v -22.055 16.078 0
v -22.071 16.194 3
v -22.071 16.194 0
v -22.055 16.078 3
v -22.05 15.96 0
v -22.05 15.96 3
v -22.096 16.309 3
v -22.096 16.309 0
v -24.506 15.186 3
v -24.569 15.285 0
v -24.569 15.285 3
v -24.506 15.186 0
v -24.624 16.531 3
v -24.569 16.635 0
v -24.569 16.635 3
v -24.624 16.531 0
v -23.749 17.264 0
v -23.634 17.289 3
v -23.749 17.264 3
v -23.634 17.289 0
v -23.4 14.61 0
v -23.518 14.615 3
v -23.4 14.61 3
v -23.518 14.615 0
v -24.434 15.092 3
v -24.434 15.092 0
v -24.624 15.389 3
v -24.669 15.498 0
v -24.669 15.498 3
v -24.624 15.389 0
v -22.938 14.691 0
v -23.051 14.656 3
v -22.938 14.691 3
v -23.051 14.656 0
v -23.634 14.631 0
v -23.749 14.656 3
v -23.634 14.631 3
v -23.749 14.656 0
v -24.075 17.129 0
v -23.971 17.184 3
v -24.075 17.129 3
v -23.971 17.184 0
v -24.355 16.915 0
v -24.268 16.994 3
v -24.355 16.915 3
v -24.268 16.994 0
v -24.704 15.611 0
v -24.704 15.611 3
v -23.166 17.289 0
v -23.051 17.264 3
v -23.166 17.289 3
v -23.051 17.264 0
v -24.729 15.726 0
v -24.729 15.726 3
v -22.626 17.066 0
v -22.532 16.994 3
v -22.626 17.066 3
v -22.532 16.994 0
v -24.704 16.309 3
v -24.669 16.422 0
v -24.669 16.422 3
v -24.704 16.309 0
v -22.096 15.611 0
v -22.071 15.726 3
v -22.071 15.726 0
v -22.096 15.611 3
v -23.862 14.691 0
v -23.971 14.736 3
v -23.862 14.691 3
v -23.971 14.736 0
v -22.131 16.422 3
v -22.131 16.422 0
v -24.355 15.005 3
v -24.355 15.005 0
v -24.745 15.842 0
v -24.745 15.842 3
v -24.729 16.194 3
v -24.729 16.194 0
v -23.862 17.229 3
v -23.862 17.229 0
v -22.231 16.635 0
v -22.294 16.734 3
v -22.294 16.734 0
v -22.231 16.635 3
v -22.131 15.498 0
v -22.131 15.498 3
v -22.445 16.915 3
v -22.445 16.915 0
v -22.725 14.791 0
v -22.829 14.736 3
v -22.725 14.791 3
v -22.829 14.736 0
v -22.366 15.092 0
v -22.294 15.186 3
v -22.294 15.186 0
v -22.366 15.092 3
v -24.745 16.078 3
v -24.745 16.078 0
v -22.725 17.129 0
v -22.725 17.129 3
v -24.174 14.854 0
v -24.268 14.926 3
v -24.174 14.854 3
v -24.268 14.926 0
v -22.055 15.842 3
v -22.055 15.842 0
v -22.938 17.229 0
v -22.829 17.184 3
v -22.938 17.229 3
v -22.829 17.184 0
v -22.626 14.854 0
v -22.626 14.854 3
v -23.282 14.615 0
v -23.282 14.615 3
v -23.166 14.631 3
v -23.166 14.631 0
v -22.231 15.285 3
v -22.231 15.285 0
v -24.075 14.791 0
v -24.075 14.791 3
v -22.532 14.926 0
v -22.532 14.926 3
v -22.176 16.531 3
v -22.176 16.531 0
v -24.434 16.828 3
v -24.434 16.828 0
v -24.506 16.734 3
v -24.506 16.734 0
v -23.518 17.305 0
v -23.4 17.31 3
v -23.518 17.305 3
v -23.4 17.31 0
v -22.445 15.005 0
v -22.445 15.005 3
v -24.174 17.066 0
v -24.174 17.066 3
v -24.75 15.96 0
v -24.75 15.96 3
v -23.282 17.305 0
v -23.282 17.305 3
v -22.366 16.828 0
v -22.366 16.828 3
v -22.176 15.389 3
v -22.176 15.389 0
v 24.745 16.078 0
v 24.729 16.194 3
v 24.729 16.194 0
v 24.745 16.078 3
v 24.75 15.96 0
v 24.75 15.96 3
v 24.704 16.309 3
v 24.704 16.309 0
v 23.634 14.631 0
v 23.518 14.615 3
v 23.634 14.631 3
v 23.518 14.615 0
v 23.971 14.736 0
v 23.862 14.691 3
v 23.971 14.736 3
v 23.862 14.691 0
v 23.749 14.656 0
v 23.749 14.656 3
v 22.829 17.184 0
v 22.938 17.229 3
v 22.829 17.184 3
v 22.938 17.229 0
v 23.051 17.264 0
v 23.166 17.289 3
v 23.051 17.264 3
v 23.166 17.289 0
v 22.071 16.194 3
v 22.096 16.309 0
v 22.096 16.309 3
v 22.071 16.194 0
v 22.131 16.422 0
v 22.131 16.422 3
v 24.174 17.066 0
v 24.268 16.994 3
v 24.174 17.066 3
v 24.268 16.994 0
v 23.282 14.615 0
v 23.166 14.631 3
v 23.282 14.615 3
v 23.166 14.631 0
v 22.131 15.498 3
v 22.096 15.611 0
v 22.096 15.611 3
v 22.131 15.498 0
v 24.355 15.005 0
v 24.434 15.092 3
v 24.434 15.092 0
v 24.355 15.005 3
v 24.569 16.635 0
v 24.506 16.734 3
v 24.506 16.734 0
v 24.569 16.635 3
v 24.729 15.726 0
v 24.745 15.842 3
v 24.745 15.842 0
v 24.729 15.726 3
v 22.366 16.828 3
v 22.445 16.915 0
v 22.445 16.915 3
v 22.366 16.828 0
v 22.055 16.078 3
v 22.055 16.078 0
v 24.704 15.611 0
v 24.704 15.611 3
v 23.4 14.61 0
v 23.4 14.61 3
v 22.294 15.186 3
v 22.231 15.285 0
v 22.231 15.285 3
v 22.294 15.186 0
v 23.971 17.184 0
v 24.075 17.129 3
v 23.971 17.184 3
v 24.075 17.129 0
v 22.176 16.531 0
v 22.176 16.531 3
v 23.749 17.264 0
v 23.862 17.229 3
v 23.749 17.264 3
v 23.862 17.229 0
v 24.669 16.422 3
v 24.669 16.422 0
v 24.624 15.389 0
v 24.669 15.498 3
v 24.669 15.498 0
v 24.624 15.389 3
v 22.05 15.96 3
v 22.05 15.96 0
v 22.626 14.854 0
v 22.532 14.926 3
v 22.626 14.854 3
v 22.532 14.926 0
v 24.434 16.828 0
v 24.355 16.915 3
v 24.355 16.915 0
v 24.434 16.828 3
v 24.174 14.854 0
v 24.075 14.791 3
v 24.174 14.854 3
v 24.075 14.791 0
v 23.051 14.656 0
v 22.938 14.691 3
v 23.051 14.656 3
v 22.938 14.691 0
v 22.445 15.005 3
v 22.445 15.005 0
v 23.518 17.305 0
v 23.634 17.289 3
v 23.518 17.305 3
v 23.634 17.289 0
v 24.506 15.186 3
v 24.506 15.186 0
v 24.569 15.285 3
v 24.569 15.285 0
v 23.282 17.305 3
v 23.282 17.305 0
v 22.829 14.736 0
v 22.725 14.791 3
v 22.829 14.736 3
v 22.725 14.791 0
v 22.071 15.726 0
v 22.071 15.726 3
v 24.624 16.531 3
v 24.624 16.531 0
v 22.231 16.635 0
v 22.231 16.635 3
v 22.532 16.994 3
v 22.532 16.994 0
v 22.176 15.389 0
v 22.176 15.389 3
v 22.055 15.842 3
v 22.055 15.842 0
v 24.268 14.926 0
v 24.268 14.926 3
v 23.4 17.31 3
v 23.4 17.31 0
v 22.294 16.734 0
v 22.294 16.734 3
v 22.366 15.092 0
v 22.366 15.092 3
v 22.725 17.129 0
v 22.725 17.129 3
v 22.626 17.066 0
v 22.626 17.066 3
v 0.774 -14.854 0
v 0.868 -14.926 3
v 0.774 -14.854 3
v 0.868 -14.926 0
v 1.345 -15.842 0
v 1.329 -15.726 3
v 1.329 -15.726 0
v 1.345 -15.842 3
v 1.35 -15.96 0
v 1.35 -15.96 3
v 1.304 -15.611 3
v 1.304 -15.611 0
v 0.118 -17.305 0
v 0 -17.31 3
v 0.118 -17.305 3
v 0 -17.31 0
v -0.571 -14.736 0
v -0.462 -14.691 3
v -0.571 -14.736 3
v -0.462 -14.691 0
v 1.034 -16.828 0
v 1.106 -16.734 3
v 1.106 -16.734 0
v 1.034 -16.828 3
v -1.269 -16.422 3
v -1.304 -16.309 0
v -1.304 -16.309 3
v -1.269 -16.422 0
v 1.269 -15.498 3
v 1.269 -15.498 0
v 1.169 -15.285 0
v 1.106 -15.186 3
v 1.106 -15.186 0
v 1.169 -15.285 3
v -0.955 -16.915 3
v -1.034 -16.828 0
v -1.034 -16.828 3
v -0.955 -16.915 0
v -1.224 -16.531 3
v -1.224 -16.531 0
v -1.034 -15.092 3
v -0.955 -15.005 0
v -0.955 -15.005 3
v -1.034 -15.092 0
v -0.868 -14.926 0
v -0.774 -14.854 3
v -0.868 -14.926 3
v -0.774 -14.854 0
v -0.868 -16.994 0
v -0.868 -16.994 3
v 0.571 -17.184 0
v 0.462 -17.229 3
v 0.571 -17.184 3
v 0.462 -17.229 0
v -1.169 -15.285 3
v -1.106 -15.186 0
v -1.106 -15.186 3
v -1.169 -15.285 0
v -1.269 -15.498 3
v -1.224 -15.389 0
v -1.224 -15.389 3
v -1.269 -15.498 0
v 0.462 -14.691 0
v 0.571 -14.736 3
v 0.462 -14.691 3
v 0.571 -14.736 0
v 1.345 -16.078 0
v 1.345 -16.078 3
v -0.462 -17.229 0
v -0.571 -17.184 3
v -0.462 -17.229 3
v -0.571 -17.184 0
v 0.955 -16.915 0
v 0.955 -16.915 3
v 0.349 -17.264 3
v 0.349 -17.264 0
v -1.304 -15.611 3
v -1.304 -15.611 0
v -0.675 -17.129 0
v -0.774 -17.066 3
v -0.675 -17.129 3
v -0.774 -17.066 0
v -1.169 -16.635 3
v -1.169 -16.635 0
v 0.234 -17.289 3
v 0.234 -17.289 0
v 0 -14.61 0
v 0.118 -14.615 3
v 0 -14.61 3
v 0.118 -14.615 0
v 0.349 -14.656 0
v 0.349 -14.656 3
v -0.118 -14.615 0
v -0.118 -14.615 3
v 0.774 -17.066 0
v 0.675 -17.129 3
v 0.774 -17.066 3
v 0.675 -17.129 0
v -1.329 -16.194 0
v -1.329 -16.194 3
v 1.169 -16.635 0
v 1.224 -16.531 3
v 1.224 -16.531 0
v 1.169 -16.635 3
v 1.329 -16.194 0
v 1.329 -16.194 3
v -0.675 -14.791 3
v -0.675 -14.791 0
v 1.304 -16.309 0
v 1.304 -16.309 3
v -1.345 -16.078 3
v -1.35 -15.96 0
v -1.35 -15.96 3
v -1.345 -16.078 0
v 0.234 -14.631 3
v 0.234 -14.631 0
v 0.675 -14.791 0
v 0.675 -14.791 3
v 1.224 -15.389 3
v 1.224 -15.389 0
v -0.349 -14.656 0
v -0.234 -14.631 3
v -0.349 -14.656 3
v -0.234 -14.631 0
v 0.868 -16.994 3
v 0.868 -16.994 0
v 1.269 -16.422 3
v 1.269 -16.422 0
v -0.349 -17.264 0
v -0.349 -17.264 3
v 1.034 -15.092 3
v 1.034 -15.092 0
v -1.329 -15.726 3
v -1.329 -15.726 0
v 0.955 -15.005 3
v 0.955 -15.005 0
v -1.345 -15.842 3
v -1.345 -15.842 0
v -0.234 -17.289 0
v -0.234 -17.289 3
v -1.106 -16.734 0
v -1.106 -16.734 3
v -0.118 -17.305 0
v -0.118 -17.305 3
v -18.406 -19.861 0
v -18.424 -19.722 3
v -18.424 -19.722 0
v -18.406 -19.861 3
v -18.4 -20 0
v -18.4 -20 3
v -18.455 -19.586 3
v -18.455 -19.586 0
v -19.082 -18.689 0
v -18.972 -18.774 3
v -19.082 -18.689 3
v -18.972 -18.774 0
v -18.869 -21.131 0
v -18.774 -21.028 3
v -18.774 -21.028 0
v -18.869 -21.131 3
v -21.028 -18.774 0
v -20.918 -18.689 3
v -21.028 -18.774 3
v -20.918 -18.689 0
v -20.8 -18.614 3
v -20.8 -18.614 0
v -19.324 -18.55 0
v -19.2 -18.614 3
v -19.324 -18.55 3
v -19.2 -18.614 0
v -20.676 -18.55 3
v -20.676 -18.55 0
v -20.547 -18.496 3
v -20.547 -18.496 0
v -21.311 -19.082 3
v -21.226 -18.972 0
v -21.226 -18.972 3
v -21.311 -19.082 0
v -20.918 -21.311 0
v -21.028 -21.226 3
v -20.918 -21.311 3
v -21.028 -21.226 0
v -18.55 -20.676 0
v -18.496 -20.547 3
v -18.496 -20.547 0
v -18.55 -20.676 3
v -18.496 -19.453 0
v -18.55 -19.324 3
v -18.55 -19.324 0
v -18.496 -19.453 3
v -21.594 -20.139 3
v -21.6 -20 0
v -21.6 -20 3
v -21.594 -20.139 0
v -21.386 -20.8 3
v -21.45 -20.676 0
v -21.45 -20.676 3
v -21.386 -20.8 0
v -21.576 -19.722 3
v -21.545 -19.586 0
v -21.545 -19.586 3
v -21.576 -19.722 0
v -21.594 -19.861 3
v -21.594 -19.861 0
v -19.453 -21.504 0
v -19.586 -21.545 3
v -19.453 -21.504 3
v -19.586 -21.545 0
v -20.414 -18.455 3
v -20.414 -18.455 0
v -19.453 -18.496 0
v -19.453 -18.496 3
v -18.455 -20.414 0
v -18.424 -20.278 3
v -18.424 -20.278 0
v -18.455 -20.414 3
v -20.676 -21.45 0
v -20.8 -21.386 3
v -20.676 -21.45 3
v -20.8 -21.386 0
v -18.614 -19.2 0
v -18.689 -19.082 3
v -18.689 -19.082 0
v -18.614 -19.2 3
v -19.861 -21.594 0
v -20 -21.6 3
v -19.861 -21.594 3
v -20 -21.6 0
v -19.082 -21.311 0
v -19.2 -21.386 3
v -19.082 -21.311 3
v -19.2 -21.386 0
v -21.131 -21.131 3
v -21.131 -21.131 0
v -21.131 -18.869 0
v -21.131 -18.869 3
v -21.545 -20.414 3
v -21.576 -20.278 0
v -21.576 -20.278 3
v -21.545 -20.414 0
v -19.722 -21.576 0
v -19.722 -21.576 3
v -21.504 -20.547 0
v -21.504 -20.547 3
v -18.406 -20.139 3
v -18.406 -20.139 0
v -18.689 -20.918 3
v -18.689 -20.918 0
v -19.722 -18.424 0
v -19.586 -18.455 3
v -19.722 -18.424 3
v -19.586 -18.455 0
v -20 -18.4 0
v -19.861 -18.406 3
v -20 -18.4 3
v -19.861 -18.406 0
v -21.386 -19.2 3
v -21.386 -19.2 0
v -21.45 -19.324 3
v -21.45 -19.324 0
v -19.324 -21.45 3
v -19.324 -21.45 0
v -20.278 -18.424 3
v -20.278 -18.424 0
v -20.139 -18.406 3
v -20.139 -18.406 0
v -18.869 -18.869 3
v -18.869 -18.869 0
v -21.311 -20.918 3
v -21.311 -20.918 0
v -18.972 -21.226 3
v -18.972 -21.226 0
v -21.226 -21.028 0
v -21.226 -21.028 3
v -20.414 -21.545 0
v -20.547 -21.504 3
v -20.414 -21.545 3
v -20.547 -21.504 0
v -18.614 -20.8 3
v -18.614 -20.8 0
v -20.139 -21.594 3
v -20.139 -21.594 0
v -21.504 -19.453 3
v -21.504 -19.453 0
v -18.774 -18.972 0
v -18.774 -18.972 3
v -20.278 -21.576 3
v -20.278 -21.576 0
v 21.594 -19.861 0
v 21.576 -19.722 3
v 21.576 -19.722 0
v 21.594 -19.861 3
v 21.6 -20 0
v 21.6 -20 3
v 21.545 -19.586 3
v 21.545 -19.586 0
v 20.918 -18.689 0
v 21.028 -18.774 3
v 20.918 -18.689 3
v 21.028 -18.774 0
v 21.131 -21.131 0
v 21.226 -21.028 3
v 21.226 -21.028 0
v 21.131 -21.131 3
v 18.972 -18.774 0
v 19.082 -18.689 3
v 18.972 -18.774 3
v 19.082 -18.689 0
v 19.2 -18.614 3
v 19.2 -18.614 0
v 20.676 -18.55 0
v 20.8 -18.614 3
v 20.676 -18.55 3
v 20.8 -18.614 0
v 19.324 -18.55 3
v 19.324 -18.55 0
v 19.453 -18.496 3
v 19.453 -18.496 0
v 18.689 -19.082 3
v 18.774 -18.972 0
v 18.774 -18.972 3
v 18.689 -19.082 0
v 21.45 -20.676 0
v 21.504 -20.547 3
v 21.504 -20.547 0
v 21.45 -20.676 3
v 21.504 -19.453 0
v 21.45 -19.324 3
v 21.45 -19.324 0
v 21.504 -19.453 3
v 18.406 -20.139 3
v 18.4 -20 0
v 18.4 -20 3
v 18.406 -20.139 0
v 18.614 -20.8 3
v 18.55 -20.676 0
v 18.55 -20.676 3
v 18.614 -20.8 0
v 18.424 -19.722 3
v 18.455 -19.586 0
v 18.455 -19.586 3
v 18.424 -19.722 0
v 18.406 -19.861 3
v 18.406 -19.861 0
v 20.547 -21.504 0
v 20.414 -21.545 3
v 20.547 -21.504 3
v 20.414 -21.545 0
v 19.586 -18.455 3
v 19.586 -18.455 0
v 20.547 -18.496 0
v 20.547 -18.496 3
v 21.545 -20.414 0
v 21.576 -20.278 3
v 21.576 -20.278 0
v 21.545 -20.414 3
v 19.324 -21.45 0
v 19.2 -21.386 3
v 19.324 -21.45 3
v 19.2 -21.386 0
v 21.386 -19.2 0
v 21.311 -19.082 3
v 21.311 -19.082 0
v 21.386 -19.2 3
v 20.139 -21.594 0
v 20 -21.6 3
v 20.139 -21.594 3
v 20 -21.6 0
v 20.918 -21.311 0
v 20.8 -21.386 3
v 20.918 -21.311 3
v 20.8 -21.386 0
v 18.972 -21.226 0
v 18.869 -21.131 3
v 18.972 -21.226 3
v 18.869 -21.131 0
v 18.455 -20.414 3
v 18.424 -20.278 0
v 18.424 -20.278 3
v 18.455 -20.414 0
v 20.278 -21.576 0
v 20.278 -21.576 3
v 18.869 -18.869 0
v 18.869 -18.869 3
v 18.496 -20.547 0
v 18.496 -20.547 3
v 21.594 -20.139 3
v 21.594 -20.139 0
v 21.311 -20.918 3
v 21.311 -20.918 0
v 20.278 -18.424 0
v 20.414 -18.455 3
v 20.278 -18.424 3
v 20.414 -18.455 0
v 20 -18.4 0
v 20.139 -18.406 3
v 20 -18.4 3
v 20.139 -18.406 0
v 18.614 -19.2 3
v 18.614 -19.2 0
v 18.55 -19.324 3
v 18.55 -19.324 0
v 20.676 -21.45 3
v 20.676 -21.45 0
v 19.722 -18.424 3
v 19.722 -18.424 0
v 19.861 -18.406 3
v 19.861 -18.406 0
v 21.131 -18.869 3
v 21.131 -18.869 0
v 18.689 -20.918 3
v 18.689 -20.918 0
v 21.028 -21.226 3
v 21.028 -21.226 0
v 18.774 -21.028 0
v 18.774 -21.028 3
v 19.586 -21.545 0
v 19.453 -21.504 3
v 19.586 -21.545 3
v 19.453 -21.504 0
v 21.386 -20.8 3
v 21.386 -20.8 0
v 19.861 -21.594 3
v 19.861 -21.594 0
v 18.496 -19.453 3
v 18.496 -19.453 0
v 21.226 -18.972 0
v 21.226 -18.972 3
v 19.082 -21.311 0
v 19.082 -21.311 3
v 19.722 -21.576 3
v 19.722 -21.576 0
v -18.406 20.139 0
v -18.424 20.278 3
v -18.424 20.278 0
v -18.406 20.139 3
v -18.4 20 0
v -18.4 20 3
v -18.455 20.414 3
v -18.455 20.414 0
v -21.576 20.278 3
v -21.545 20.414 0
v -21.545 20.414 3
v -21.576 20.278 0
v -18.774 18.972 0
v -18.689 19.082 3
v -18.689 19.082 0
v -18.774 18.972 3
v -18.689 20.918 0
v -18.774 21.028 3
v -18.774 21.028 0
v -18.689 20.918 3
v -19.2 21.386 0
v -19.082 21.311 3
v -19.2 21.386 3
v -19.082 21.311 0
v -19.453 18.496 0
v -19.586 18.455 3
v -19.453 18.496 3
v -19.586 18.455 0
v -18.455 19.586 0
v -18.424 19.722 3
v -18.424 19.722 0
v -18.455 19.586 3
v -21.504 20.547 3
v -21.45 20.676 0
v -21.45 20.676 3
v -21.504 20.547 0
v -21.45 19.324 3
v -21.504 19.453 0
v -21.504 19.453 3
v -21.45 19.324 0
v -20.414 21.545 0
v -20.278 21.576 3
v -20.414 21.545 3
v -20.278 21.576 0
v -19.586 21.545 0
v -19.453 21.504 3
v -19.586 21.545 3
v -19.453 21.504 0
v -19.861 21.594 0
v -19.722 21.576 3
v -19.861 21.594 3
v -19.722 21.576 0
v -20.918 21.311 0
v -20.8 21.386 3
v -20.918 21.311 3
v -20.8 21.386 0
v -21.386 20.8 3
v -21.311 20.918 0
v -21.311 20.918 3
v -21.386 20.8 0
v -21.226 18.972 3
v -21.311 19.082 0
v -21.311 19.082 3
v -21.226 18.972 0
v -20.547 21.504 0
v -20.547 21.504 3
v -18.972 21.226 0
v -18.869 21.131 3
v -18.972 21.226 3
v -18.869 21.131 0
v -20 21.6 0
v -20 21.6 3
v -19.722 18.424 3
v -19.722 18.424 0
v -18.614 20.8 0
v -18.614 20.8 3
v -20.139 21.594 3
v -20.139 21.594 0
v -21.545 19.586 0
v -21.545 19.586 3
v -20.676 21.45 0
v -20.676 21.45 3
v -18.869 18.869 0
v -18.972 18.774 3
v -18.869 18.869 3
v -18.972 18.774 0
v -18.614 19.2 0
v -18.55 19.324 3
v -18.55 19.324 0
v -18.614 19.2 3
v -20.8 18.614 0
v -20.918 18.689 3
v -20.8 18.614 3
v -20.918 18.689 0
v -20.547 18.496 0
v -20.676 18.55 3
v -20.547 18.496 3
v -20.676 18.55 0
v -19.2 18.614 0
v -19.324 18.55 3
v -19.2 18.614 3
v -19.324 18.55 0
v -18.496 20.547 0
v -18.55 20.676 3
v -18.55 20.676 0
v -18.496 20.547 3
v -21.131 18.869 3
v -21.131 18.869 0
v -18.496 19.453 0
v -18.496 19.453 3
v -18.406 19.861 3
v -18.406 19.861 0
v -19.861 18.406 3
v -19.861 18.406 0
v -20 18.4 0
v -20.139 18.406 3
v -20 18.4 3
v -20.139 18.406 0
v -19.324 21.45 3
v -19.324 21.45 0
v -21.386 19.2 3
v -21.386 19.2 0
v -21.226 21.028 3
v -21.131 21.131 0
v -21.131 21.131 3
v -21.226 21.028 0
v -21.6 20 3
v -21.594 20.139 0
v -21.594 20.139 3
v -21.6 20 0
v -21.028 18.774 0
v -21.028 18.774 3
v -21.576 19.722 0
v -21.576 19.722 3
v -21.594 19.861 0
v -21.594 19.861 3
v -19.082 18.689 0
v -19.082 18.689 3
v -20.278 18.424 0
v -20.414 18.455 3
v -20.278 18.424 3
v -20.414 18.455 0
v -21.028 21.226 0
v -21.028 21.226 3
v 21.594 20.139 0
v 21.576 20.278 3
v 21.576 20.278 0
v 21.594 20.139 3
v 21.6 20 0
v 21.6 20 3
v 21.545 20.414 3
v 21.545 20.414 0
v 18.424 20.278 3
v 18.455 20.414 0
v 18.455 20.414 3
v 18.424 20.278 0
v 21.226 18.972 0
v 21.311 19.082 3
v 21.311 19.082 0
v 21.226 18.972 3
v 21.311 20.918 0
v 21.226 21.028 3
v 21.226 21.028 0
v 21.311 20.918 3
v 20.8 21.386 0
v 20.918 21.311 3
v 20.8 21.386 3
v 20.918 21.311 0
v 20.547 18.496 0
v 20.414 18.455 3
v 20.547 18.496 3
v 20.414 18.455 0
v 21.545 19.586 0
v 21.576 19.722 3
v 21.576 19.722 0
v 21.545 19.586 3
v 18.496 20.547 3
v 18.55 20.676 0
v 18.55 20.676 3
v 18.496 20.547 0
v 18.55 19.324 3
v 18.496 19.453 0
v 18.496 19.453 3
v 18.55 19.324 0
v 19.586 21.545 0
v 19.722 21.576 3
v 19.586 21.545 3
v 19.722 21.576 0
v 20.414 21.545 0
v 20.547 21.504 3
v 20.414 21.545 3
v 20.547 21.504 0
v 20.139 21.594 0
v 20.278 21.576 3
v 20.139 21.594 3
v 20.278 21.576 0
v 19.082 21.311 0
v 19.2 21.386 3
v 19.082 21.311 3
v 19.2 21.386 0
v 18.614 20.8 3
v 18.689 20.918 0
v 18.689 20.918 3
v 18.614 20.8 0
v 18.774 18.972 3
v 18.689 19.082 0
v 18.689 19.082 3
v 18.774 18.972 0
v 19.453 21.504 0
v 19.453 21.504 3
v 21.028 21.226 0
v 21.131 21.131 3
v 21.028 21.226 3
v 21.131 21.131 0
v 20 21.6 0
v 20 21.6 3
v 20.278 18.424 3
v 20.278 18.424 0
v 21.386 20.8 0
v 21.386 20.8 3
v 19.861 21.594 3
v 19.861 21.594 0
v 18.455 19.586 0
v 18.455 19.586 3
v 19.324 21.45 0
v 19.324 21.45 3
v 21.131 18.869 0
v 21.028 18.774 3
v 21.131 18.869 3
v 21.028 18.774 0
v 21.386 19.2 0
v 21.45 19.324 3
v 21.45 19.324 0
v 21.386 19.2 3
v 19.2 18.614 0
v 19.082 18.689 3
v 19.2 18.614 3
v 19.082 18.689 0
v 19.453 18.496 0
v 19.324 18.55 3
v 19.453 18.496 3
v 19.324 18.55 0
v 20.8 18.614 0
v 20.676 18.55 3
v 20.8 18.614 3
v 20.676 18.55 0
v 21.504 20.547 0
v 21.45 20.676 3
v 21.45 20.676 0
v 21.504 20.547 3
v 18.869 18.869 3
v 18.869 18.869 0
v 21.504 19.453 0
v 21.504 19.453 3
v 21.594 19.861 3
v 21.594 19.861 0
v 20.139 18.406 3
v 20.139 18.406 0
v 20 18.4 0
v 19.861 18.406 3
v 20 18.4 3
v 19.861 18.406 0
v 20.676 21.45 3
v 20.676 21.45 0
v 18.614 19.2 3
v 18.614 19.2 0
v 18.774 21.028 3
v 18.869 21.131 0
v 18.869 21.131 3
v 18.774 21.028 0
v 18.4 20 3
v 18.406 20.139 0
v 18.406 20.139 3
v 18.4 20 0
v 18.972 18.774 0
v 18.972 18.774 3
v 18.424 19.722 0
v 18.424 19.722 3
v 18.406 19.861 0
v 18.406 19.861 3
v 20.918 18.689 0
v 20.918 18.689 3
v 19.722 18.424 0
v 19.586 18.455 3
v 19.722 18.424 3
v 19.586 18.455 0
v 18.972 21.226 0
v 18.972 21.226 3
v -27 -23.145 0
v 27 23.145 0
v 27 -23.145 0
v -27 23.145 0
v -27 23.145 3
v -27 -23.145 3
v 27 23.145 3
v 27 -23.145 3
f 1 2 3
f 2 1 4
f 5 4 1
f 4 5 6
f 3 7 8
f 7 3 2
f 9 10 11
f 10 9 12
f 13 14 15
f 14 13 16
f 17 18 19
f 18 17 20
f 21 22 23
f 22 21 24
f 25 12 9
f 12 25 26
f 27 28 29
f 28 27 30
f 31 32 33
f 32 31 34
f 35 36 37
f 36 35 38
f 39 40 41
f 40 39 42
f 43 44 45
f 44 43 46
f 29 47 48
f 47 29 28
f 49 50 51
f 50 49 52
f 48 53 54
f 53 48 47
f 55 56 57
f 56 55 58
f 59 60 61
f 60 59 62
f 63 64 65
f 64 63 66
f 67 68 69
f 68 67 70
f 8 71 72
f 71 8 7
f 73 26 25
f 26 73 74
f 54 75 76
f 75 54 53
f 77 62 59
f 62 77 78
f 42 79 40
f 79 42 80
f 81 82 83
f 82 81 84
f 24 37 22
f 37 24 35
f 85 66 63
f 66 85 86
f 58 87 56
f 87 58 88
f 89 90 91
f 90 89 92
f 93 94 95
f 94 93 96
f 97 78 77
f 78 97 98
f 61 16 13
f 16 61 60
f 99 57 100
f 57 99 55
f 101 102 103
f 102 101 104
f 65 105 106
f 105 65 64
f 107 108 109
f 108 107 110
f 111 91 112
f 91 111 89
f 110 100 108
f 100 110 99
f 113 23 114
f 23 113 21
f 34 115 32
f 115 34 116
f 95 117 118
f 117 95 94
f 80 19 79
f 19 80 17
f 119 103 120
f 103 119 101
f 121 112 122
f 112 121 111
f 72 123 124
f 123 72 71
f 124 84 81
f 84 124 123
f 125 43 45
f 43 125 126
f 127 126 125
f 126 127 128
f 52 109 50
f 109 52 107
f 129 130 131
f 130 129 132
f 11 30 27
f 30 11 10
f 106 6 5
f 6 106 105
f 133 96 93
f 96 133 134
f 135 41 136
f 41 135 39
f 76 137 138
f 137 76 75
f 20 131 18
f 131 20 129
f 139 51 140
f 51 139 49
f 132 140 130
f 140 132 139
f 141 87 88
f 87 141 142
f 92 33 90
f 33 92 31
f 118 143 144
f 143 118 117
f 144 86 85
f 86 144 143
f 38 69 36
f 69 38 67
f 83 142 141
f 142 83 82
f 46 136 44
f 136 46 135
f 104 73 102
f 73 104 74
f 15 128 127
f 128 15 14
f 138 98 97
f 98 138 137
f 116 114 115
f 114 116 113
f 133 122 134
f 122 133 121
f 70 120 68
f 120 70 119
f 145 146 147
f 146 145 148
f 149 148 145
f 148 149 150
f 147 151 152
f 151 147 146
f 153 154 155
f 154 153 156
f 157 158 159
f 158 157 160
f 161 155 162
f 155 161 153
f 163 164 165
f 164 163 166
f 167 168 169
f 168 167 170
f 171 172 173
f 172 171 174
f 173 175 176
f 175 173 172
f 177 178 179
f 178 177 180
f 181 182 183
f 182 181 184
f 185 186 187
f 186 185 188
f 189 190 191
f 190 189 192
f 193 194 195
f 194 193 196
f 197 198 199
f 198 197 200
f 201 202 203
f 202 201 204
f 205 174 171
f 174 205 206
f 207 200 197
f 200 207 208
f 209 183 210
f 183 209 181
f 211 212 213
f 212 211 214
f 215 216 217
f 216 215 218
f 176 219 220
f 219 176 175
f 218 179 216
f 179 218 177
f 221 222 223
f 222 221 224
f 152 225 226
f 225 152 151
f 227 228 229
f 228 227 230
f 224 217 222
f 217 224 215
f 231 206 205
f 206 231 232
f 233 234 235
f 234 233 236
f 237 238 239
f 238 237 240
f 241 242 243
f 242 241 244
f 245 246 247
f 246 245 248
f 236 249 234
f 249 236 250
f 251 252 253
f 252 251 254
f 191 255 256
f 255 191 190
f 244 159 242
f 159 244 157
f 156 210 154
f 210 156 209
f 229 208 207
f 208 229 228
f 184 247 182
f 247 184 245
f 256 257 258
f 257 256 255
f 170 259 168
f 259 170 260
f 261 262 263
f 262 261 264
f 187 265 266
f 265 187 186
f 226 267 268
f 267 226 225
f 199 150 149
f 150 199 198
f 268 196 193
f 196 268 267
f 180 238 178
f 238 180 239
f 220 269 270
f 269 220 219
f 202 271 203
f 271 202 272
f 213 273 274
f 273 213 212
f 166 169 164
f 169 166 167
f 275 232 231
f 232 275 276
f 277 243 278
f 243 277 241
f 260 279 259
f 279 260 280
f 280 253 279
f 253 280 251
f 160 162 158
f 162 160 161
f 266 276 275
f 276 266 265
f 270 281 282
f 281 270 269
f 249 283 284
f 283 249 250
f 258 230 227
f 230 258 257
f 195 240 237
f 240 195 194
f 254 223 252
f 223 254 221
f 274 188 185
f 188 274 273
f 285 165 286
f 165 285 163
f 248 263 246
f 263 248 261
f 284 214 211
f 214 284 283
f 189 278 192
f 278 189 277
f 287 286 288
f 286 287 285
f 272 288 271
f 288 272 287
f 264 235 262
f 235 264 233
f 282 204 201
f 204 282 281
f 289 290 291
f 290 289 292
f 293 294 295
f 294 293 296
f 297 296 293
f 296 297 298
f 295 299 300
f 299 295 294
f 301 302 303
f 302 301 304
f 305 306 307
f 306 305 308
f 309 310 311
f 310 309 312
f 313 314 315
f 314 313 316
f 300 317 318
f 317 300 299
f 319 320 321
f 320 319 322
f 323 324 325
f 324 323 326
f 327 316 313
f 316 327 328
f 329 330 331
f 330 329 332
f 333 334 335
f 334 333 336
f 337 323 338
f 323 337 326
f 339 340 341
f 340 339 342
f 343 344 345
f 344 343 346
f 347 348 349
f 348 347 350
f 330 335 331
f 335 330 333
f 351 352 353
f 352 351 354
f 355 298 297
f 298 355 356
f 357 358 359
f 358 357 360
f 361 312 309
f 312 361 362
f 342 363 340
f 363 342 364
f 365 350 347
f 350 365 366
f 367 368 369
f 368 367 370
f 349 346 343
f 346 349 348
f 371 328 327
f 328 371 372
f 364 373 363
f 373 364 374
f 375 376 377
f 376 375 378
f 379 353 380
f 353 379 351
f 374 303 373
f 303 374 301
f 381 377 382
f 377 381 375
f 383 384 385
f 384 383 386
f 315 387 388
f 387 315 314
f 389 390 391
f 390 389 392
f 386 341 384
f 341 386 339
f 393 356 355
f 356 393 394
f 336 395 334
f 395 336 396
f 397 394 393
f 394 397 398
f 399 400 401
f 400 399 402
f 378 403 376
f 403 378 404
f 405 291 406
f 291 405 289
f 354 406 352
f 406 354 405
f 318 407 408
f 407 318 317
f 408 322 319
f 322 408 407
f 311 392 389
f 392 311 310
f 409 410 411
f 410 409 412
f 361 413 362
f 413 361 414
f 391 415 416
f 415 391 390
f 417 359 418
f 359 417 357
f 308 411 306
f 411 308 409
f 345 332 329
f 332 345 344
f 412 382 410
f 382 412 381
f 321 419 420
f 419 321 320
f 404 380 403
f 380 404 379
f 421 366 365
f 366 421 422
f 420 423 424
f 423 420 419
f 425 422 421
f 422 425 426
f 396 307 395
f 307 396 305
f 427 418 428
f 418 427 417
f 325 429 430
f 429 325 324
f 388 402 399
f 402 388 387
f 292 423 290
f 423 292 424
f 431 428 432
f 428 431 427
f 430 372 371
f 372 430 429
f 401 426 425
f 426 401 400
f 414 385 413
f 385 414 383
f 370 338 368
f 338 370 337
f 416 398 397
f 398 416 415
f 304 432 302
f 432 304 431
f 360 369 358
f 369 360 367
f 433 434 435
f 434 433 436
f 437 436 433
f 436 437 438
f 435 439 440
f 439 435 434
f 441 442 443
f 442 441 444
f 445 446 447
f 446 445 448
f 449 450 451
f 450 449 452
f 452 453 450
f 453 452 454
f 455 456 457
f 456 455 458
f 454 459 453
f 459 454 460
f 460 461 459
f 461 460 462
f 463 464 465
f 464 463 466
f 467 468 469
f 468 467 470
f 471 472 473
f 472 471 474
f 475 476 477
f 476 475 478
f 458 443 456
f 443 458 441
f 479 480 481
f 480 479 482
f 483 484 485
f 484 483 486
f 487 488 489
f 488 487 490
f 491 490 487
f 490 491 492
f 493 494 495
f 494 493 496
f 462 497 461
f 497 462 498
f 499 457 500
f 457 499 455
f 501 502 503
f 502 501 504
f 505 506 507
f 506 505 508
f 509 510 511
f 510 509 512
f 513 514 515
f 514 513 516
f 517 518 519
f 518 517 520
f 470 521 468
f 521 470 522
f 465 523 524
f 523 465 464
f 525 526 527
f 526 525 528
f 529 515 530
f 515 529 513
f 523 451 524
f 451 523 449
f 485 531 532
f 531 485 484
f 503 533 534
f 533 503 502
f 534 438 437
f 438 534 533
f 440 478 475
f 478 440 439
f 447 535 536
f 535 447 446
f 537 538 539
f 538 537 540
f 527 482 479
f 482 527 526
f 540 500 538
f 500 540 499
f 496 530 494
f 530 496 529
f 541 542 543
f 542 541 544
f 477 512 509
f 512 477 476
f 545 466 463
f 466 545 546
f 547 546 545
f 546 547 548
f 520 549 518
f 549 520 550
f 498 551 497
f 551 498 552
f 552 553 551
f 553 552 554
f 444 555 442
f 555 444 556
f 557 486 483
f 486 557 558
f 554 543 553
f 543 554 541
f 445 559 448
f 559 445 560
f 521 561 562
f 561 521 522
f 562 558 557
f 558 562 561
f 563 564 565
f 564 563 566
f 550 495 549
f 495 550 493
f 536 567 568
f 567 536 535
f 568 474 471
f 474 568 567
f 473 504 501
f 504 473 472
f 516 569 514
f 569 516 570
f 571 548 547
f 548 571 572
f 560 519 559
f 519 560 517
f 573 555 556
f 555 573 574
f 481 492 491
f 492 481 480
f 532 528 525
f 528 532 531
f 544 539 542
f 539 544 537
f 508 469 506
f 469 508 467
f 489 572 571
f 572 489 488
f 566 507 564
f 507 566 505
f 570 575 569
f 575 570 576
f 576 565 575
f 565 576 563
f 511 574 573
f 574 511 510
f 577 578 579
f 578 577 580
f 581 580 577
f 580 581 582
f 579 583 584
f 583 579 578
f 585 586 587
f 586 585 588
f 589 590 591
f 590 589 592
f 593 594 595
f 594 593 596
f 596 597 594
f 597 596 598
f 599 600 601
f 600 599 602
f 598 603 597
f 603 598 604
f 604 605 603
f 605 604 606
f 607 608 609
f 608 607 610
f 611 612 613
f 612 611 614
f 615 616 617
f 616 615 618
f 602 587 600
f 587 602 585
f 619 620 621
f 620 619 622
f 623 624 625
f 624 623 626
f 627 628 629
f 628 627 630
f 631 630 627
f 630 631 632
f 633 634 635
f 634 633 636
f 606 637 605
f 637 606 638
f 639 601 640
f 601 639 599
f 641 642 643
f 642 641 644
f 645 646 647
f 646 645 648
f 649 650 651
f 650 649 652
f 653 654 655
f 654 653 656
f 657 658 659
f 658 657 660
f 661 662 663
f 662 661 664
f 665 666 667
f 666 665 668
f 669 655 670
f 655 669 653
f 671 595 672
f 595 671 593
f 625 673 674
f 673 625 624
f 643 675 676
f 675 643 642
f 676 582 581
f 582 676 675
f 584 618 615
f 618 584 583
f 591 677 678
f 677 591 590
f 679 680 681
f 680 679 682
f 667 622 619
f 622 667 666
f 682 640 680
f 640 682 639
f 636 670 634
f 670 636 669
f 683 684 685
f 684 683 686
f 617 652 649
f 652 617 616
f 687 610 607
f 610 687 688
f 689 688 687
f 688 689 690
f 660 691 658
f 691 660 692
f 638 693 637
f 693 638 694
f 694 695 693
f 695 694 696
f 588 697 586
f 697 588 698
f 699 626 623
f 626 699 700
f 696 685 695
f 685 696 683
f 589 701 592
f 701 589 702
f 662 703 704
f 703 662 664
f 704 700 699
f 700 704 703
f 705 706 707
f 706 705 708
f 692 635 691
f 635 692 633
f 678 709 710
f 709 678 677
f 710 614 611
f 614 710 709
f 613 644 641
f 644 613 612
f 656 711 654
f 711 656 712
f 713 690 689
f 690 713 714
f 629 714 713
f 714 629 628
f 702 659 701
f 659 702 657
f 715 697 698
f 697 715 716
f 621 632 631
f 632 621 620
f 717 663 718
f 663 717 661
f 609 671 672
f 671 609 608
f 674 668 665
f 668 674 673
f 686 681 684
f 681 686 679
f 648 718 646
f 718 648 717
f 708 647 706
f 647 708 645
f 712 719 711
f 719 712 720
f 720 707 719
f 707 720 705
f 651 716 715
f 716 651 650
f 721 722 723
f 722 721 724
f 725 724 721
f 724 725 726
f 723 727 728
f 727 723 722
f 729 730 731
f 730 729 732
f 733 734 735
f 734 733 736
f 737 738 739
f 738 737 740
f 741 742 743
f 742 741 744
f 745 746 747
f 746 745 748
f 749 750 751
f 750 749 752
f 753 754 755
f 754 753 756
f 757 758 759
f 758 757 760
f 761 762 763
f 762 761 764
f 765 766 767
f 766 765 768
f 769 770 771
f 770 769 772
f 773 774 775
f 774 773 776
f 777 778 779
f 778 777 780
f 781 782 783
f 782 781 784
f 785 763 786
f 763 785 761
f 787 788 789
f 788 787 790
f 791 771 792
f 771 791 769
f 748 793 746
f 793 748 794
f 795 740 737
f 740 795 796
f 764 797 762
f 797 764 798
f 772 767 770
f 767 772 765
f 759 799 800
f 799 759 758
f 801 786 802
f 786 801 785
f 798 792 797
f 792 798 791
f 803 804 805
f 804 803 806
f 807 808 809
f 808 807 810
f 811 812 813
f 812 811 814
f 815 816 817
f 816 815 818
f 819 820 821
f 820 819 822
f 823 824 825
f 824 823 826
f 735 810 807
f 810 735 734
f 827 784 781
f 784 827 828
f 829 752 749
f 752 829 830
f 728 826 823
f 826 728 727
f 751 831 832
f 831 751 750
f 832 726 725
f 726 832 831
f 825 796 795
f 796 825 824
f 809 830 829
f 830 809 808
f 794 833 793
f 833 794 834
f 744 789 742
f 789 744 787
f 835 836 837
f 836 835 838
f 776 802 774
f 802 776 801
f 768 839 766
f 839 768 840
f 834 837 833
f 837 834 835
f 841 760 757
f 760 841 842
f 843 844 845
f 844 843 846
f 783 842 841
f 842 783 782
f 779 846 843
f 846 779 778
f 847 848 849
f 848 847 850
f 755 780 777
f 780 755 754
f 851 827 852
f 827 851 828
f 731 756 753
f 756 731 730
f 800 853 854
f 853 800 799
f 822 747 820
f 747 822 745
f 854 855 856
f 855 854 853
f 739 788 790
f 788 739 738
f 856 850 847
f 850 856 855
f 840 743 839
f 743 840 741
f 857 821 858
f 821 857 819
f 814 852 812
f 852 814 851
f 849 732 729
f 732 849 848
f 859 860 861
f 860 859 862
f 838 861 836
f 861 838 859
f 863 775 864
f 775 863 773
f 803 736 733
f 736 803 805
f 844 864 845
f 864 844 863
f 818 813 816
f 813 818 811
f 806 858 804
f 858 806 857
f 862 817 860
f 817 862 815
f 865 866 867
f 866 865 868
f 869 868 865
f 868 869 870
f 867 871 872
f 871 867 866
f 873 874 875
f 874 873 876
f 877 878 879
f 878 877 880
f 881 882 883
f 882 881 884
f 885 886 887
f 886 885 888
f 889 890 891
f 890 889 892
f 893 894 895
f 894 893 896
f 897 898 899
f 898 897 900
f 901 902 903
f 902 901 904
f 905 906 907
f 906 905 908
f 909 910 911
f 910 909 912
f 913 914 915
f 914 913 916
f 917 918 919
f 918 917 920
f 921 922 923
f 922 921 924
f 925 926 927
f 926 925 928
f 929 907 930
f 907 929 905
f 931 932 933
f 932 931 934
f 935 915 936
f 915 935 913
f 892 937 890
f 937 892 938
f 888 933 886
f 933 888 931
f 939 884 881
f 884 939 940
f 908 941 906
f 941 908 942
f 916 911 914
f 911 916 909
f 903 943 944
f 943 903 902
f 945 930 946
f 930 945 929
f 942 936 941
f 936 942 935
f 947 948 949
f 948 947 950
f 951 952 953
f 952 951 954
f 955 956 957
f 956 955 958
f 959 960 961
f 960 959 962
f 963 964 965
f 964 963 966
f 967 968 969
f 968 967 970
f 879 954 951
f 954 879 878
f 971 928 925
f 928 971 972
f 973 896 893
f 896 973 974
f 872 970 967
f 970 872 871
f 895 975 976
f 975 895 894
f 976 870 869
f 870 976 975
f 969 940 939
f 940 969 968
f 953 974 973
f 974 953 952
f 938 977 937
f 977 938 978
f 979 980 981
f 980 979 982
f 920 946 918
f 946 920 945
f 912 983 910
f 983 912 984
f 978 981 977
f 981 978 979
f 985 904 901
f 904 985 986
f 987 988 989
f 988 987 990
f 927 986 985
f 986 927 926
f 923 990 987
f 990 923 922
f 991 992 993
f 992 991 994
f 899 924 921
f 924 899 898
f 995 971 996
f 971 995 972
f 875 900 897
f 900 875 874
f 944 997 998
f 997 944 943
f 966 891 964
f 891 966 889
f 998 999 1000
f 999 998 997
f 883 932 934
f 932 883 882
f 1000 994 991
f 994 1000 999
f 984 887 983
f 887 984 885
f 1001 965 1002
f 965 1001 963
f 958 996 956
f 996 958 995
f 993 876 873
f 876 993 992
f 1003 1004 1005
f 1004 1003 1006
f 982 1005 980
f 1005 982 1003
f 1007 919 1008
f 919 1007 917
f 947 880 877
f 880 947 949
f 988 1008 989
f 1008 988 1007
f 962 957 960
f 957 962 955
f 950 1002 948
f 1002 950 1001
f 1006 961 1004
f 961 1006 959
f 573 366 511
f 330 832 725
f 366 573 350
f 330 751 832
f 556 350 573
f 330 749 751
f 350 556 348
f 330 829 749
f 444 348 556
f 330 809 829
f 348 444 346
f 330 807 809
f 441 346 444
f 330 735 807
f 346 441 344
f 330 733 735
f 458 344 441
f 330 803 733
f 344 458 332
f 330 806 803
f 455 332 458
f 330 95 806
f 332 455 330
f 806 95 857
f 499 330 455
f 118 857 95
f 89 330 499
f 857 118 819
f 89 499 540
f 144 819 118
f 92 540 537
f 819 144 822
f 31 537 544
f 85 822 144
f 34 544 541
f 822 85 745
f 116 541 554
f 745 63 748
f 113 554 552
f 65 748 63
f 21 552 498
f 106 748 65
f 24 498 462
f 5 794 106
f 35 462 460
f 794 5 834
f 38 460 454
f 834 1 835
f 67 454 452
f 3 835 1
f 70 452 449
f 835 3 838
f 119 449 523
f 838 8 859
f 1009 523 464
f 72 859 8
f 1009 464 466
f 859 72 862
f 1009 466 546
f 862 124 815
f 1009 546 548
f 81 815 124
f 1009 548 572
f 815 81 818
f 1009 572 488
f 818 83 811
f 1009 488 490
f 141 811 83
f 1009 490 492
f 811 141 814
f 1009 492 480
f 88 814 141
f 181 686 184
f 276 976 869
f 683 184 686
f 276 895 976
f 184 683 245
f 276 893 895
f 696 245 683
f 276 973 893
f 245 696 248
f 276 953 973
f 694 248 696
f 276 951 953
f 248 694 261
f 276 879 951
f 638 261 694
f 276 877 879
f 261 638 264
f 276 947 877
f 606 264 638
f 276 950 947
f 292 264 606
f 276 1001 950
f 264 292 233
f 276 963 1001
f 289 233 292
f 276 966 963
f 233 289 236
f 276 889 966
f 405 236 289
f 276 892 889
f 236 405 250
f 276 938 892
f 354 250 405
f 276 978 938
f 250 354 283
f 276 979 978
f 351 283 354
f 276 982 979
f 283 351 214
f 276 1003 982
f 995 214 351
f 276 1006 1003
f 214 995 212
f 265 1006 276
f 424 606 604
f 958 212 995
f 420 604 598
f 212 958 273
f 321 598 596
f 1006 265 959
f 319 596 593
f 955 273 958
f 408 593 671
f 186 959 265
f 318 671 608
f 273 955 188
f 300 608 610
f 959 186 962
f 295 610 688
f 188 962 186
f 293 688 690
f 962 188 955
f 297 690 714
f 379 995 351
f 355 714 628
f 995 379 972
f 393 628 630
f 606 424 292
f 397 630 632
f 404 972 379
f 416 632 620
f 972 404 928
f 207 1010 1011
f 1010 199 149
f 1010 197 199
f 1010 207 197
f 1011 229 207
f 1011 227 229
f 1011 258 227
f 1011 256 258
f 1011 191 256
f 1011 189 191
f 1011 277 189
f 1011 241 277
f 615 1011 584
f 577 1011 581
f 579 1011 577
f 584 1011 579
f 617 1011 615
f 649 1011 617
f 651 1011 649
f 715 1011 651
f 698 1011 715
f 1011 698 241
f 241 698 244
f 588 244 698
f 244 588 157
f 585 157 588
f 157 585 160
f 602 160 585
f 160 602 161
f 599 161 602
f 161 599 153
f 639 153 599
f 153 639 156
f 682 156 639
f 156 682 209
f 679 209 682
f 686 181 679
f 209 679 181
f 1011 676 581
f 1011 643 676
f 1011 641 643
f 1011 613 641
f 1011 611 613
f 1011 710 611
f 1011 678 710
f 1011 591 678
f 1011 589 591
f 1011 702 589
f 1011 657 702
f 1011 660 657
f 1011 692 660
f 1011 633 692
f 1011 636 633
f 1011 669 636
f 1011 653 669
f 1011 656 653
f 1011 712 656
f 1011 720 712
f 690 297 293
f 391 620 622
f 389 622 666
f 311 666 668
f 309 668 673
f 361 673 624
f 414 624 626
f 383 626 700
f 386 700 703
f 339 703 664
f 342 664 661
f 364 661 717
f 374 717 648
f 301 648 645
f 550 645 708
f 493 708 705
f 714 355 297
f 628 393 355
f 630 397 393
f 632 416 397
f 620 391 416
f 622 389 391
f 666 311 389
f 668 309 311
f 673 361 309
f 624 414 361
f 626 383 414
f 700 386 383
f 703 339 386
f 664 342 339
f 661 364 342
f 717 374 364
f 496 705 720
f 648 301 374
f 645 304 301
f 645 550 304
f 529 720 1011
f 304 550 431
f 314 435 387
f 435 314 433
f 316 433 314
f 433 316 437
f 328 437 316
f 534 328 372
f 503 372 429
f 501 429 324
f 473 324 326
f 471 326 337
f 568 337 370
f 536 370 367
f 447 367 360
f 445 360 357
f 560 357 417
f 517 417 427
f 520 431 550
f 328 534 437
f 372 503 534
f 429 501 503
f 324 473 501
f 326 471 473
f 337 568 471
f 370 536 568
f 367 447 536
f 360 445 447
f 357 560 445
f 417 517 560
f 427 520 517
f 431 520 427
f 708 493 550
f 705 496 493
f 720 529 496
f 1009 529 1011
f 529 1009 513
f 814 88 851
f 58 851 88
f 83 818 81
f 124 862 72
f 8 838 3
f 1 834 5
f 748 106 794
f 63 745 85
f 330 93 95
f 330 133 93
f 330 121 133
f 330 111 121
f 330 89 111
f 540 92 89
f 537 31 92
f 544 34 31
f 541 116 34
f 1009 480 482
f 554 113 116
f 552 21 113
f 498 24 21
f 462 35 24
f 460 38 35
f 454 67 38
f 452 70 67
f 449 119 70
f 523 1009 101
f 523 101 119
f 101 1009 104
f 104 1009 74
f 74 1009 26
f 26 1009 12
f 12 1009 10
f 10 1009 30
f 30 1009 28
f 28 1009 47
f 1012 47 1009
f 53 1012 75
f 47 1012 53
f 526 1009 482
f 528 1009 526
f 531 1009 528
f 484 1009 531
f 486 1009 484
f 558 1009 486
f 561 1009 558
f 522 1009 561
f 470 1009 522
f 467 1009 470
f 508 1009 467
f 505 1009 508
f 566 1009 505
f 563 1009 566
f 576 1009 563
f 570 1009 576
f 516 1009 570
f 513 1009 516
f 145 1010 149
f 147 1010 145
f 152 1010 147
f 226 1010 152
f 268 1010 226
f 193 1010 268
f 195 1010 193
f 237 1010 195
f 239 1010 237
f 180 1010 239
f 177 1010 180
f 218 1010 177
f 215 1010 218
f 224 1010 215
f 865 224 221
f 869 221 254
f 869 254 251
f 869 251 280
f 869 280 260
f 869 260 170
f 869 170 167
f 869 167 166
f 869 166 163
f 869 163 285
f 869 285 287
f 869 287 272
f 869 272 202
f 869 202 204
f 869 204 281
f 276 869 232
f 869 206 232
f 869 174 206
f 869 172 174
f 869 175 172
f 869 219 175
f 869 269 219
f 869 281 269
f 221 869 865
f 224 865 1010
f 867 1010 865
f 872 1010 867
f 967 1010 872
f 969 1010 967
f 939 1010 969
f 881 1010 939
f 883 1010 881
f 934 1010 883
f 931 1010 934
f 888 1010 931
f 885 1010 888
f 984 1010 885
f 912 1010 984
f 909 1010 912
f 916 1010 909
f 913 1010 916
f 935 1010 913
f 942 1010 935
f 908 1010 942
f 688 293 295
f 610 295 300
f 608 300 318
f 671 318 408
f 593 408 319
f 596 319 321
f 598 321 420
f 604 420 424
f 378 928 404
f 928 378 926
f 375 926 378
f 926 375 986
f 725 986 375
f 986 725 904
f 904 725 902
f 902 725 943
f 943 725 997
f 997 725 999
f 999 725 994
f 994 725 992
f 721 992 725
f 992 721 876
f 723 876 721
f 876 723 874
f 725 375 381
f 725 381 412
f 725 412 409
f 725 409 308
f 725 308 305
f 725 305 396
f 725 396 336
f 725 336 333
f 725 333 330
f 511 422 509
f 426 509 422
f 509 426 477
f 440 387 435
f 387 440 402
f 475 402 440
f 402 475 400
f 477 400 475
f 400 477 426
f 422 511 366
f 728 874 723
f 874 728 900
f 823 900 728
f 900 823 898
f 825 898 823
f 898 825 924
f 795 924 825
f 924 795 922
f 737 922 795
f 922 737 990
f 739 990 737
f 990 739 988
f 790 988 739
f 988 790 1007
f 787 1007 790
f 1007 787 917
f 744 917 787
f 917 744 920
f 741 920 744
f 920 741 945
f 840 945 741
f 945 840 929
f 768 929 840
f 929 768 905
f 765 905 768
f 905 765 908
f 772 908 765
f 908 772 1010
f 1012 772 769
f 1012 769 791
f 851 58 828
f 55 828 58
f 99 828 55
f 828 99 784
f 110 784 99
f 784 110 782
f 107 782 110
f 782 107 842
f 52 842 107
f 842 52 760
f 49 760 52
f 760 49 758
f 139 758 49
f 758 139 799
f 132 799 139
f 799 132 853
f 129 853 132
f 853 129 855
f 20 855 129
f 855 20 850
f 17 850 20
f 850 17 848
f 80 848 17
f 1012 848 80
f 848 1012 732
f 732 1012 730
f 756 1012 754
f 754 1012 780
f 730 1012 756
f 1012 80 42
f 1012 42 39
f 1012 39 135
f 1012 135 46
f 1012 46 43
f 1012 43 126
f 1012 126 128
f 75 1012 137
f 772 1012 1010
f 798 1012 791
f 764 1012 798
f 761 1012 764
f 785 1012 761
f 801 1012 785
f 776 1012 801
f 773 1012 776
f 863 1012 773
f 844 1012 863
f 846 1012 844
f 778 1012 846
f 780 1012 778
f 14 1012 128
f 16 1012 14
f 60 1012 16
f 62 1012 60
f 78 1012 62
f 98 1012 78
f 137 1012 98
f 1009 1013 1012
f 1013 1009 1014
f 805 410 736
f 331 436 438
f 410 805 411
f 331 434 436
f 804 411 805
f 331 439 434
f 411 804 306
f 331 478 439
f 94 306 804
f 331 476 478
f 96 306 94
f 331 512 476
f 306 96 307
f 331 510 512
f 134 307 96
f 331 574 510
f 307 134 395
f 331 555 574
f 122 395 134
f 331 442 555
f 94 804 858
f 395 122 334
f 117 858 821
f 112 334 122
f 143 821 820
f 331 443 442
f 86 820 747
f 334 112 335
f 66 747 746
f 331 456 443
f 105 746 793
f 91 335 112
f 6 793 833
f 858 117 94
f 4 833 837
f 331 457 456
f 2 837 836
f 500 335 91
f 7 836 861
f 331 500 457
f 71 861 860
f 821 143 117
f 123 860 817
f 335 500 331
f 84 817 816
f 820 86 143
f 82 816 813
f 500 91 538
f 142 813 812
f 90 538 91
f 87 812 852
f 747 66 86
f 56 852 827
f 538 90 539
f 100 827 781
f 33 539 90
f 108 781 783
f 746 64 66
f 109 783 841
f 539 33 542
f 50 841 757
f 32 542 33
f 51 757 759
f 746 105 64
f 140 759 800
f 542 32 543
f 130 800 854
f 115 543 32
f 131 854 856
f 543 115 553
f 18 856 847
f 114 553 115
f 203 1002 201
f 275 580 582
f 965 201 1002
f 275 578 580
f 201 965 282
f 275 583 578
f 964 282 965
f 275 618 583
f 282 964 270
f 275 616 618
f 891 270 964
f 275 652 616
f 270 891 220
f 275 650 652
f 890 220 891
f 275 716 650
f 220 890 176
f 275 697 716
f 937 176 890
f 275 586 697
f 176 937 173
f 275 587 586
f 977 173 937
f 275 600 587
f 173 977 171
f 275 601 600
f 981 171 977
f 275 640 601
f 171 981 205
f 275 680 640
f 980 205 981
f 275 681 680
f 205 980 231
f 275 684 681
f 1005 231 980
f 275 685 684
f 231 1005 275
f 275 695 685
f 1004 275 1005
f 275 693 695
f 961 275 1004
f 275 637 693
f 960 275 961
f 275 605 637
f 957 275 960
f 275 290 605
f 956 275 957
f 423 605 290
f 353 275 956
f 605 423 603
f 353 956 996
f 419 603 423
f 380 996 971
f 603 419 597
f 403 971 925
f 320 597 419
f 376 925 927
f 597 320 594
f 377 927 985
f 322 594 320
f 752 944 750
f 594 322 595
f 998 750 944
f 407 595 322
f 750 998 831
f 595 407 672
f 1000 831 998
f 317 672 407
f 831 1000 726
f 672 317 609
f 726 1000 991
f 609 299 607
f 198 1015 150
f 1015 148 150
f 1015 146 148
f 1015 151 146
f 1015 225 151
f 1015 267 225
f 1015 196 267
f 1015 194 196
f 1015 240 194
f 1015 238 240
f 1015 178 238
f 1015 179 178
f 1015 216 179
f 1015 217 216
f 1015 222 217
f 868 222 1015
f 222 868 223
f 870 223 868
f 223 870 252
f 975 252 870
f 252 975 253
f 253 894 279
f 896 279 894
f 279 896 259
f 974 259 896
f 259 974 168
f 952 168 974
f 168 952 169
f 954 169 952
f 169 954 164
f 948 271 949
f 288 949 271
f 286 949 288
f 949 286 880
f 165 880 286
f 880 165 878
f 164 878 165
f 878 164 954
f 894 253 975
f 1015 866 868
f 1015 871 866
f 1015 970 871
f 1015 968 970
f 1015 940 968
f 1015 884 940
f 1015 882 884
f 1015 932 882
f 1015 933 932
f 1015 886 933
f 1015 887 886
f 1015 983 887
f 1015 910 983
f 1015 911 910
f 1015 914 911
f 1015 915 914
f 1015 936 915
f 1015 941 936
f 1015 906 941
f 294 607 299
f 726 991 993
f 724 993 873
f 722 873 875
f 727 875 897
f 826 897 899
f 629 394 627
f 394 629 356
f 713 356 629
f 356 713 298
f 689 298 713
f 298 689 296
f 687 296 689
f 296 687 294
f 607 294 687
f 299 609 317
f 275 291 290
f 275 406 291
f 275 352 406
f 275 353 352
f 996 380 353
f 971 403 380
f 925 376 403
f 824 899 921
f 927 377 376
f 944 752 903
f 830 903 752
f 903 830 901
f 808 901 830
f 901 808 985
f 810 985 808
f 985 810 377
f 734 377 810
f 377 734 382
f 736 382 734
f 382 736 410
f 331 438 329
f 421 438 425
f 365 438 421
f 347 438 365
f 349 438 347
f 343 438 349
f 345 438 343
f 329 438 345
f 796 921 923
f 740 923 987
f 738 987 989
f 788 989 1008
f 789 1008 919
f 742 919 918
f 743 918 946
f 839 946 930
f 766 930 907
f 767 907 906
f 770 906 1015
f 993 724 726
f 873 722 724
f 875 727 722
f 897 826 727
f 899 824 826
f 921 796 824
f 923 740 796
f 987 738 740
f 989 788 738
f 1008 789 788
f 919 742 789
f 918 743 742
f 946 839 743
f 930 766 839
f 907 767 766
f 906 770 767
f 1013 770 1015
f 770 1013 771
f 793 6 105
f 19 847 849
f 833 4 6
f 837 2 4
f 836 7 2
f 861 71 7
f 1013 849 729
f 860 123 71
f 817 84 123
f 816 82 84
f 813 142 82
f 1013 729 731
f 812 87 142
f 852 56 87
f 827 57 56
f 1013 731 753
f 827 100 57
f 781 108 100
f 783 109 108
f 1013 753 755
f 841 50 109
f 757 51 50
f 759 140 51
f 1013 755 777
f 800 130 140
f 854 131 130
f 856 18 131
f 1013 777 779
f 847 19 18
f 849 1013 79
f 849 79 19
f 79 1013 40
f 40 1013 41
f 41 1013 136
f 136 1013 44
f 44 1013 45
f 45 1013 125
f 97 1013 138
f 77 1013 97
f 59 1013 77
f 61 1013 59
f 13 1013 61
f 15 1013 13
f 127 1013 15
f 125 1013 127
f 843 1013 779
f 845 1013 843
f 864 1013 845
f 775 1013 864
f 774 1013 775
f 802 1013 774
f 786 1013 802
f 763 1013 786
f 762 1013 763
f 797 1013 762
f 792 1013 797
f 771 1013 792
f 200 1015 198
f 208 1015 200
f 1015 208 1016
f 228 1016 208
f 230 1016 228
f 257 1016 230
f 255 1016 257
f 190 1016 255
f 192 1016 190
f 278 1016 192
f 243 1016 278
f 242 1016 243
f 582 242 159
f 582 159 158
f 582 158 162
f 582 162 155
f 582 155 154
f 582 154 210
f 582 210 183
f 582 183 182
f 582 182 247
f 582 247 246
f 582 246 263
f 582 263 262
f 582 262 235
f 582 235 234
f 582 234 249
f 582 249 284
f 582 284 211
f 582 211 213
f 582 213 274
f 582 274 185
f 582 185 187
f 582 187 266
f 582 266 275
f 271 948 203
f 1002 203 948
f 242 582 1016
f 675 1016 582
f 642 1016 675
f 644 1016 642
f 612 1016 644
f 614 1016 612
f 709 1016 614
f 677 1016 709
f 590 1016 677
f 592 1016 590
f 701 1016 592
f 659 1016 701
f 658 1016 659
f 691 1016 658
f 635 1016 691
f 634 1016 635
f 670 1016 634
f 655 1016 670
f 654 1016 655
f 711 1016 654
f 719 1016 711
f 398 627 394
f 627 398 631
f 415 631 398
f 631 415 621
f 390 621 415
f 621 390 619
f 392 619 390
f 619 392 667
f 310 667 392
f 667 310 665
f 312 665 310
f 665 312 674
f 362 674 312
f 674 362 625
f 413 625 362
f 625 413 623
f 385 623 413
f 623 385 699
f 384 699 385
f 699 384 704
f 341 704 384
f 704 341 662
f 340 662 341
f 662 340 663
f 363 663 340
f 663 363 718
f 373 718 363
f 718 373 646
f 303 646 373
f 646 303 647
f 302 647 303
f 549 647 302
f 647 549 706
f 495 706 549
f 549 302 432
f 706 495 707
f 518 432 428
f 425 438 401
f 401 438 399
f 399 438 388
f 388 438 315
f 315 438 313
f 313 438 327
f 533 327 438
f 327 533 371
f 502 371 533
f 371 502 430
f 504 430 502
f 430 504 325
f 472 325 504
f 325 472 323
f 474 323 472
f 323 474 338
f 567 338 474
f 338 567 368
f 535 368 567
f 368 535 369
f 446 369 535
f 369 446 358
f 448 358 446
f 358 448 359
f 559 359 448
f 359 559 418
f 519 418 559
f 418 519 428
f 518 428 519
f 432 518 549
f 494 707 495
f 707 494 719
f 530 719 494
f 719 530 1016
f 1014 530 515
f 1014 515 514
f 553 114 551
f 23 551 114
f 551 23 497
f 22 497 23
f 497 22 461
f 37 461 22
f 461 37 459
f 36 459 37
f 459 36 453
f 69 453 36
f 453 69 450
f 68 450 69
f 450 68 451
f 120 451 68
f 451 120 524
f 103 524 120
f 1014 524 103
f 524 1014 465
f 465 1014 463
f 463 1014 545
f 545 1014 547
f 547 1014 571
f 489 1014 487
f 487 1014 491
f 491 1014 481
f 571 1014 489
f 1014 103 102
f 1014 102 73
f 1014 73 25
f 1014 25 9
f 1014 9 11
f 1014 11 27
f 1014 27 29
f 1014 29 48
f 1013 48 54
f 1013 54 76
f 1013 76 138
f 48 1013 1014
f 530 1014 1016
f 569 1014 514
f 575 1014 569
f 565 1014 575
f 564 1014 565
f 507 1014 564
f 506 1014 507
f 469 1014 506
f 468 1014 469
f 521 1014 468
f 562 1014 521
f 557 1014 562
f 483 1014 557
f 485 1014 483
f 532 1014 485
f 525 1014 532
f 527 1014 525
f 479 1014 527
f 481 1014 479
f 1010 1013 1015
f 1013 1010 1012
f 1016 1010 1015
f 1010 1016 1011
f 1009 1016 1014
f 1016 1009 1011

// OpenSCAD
// Plaque support LD06 (a poser sur 4 entretoises imprimees) - cotes en mm
// Dessus = motif de fixation du LD06 (datasheet) ; trous d'angle = entretoises.
// Ouvre dans OpenSCAD -> F6 -> File > Export as STL.

/* [Plaque] */
plate_x = 54.00;   // largeur = footprint LD06 (datasheet)
plate_y = 46.29;   // profondeur = footprint LD06 (datasheet)
plate_t = 3;       // epaisseur

/* [Fixation LD06 - datasheet] */
lid_hx     = 46.80;  // entraxe trous en X
lid_hy     = 31.92;  // entraxe trous en Y
lid_hole_d = 2.7;    // Ø percage (passage vis M2.5 ; LIDAR = Ø2.5)

/* [Fixation sur entretoises] */
mount_pitch = 20;    // grille 20 mm de la base
mount_d     = 3.2;   // Ø passage vis M3 vers les entretoises

/* [Divers] */
cable_d = 0;         // trou central passage cable (0 = aucun)
seat_d  = 0;         // Ø leger lamage pour caler le corps rond du LIDAR (0 = aucun)
seat_h  = 1.0;       // profondeur du lamage

$fn = 72;
eps = 0.01;

// 3 trous du LD06 -- VERIFIE l'agencement exact sur ton datasheet et ajuste si besoin
lid_holes = [[-lid_hx/2,  lid_hy/2],
             [ lid_hx/2,  lid_hy/2],
             [ 0,        -lid_hy/2]];

// 4 entretoises sur la grille 20 mm (sous la plaque) -- aligne sur les trous reels de la base
mount_holes = [[-mount_pitch, -mount_pitch], [ mount_pitch, -mount_pitch],
               [-mount_pitch,  mount_pitch], [ mount_pitch,  mount_pitch]];

difference() {
    linear_extrude(plate_t) square([plate_x, plate_y], center = true);
    // trous LD06
    for (h = lid_holes)
        translate([h[0], h[1], -eps]) cylinder(d = lid_hole_d, h = plate_t + 2*eps);
    // trous entretoises
    for (h = mount_holes)
        translate([h[0], h[1], -eps]) cylinder(d = mount_d, h = plate_t + 2*eps);
    // passage cable central (optionnel)
    if (cable_d > 0)
        translate([0, 0, -eps]) cylinder(d = cable_d, h = plate_t + 2*eps);
    // lamage pour caler le corps rond (optionnel)
    if (seat_d > 0)
        translate([0, 0, plate_t - seat_h]) cylinder(d = seat_d, h = seat_h + eps);
}
